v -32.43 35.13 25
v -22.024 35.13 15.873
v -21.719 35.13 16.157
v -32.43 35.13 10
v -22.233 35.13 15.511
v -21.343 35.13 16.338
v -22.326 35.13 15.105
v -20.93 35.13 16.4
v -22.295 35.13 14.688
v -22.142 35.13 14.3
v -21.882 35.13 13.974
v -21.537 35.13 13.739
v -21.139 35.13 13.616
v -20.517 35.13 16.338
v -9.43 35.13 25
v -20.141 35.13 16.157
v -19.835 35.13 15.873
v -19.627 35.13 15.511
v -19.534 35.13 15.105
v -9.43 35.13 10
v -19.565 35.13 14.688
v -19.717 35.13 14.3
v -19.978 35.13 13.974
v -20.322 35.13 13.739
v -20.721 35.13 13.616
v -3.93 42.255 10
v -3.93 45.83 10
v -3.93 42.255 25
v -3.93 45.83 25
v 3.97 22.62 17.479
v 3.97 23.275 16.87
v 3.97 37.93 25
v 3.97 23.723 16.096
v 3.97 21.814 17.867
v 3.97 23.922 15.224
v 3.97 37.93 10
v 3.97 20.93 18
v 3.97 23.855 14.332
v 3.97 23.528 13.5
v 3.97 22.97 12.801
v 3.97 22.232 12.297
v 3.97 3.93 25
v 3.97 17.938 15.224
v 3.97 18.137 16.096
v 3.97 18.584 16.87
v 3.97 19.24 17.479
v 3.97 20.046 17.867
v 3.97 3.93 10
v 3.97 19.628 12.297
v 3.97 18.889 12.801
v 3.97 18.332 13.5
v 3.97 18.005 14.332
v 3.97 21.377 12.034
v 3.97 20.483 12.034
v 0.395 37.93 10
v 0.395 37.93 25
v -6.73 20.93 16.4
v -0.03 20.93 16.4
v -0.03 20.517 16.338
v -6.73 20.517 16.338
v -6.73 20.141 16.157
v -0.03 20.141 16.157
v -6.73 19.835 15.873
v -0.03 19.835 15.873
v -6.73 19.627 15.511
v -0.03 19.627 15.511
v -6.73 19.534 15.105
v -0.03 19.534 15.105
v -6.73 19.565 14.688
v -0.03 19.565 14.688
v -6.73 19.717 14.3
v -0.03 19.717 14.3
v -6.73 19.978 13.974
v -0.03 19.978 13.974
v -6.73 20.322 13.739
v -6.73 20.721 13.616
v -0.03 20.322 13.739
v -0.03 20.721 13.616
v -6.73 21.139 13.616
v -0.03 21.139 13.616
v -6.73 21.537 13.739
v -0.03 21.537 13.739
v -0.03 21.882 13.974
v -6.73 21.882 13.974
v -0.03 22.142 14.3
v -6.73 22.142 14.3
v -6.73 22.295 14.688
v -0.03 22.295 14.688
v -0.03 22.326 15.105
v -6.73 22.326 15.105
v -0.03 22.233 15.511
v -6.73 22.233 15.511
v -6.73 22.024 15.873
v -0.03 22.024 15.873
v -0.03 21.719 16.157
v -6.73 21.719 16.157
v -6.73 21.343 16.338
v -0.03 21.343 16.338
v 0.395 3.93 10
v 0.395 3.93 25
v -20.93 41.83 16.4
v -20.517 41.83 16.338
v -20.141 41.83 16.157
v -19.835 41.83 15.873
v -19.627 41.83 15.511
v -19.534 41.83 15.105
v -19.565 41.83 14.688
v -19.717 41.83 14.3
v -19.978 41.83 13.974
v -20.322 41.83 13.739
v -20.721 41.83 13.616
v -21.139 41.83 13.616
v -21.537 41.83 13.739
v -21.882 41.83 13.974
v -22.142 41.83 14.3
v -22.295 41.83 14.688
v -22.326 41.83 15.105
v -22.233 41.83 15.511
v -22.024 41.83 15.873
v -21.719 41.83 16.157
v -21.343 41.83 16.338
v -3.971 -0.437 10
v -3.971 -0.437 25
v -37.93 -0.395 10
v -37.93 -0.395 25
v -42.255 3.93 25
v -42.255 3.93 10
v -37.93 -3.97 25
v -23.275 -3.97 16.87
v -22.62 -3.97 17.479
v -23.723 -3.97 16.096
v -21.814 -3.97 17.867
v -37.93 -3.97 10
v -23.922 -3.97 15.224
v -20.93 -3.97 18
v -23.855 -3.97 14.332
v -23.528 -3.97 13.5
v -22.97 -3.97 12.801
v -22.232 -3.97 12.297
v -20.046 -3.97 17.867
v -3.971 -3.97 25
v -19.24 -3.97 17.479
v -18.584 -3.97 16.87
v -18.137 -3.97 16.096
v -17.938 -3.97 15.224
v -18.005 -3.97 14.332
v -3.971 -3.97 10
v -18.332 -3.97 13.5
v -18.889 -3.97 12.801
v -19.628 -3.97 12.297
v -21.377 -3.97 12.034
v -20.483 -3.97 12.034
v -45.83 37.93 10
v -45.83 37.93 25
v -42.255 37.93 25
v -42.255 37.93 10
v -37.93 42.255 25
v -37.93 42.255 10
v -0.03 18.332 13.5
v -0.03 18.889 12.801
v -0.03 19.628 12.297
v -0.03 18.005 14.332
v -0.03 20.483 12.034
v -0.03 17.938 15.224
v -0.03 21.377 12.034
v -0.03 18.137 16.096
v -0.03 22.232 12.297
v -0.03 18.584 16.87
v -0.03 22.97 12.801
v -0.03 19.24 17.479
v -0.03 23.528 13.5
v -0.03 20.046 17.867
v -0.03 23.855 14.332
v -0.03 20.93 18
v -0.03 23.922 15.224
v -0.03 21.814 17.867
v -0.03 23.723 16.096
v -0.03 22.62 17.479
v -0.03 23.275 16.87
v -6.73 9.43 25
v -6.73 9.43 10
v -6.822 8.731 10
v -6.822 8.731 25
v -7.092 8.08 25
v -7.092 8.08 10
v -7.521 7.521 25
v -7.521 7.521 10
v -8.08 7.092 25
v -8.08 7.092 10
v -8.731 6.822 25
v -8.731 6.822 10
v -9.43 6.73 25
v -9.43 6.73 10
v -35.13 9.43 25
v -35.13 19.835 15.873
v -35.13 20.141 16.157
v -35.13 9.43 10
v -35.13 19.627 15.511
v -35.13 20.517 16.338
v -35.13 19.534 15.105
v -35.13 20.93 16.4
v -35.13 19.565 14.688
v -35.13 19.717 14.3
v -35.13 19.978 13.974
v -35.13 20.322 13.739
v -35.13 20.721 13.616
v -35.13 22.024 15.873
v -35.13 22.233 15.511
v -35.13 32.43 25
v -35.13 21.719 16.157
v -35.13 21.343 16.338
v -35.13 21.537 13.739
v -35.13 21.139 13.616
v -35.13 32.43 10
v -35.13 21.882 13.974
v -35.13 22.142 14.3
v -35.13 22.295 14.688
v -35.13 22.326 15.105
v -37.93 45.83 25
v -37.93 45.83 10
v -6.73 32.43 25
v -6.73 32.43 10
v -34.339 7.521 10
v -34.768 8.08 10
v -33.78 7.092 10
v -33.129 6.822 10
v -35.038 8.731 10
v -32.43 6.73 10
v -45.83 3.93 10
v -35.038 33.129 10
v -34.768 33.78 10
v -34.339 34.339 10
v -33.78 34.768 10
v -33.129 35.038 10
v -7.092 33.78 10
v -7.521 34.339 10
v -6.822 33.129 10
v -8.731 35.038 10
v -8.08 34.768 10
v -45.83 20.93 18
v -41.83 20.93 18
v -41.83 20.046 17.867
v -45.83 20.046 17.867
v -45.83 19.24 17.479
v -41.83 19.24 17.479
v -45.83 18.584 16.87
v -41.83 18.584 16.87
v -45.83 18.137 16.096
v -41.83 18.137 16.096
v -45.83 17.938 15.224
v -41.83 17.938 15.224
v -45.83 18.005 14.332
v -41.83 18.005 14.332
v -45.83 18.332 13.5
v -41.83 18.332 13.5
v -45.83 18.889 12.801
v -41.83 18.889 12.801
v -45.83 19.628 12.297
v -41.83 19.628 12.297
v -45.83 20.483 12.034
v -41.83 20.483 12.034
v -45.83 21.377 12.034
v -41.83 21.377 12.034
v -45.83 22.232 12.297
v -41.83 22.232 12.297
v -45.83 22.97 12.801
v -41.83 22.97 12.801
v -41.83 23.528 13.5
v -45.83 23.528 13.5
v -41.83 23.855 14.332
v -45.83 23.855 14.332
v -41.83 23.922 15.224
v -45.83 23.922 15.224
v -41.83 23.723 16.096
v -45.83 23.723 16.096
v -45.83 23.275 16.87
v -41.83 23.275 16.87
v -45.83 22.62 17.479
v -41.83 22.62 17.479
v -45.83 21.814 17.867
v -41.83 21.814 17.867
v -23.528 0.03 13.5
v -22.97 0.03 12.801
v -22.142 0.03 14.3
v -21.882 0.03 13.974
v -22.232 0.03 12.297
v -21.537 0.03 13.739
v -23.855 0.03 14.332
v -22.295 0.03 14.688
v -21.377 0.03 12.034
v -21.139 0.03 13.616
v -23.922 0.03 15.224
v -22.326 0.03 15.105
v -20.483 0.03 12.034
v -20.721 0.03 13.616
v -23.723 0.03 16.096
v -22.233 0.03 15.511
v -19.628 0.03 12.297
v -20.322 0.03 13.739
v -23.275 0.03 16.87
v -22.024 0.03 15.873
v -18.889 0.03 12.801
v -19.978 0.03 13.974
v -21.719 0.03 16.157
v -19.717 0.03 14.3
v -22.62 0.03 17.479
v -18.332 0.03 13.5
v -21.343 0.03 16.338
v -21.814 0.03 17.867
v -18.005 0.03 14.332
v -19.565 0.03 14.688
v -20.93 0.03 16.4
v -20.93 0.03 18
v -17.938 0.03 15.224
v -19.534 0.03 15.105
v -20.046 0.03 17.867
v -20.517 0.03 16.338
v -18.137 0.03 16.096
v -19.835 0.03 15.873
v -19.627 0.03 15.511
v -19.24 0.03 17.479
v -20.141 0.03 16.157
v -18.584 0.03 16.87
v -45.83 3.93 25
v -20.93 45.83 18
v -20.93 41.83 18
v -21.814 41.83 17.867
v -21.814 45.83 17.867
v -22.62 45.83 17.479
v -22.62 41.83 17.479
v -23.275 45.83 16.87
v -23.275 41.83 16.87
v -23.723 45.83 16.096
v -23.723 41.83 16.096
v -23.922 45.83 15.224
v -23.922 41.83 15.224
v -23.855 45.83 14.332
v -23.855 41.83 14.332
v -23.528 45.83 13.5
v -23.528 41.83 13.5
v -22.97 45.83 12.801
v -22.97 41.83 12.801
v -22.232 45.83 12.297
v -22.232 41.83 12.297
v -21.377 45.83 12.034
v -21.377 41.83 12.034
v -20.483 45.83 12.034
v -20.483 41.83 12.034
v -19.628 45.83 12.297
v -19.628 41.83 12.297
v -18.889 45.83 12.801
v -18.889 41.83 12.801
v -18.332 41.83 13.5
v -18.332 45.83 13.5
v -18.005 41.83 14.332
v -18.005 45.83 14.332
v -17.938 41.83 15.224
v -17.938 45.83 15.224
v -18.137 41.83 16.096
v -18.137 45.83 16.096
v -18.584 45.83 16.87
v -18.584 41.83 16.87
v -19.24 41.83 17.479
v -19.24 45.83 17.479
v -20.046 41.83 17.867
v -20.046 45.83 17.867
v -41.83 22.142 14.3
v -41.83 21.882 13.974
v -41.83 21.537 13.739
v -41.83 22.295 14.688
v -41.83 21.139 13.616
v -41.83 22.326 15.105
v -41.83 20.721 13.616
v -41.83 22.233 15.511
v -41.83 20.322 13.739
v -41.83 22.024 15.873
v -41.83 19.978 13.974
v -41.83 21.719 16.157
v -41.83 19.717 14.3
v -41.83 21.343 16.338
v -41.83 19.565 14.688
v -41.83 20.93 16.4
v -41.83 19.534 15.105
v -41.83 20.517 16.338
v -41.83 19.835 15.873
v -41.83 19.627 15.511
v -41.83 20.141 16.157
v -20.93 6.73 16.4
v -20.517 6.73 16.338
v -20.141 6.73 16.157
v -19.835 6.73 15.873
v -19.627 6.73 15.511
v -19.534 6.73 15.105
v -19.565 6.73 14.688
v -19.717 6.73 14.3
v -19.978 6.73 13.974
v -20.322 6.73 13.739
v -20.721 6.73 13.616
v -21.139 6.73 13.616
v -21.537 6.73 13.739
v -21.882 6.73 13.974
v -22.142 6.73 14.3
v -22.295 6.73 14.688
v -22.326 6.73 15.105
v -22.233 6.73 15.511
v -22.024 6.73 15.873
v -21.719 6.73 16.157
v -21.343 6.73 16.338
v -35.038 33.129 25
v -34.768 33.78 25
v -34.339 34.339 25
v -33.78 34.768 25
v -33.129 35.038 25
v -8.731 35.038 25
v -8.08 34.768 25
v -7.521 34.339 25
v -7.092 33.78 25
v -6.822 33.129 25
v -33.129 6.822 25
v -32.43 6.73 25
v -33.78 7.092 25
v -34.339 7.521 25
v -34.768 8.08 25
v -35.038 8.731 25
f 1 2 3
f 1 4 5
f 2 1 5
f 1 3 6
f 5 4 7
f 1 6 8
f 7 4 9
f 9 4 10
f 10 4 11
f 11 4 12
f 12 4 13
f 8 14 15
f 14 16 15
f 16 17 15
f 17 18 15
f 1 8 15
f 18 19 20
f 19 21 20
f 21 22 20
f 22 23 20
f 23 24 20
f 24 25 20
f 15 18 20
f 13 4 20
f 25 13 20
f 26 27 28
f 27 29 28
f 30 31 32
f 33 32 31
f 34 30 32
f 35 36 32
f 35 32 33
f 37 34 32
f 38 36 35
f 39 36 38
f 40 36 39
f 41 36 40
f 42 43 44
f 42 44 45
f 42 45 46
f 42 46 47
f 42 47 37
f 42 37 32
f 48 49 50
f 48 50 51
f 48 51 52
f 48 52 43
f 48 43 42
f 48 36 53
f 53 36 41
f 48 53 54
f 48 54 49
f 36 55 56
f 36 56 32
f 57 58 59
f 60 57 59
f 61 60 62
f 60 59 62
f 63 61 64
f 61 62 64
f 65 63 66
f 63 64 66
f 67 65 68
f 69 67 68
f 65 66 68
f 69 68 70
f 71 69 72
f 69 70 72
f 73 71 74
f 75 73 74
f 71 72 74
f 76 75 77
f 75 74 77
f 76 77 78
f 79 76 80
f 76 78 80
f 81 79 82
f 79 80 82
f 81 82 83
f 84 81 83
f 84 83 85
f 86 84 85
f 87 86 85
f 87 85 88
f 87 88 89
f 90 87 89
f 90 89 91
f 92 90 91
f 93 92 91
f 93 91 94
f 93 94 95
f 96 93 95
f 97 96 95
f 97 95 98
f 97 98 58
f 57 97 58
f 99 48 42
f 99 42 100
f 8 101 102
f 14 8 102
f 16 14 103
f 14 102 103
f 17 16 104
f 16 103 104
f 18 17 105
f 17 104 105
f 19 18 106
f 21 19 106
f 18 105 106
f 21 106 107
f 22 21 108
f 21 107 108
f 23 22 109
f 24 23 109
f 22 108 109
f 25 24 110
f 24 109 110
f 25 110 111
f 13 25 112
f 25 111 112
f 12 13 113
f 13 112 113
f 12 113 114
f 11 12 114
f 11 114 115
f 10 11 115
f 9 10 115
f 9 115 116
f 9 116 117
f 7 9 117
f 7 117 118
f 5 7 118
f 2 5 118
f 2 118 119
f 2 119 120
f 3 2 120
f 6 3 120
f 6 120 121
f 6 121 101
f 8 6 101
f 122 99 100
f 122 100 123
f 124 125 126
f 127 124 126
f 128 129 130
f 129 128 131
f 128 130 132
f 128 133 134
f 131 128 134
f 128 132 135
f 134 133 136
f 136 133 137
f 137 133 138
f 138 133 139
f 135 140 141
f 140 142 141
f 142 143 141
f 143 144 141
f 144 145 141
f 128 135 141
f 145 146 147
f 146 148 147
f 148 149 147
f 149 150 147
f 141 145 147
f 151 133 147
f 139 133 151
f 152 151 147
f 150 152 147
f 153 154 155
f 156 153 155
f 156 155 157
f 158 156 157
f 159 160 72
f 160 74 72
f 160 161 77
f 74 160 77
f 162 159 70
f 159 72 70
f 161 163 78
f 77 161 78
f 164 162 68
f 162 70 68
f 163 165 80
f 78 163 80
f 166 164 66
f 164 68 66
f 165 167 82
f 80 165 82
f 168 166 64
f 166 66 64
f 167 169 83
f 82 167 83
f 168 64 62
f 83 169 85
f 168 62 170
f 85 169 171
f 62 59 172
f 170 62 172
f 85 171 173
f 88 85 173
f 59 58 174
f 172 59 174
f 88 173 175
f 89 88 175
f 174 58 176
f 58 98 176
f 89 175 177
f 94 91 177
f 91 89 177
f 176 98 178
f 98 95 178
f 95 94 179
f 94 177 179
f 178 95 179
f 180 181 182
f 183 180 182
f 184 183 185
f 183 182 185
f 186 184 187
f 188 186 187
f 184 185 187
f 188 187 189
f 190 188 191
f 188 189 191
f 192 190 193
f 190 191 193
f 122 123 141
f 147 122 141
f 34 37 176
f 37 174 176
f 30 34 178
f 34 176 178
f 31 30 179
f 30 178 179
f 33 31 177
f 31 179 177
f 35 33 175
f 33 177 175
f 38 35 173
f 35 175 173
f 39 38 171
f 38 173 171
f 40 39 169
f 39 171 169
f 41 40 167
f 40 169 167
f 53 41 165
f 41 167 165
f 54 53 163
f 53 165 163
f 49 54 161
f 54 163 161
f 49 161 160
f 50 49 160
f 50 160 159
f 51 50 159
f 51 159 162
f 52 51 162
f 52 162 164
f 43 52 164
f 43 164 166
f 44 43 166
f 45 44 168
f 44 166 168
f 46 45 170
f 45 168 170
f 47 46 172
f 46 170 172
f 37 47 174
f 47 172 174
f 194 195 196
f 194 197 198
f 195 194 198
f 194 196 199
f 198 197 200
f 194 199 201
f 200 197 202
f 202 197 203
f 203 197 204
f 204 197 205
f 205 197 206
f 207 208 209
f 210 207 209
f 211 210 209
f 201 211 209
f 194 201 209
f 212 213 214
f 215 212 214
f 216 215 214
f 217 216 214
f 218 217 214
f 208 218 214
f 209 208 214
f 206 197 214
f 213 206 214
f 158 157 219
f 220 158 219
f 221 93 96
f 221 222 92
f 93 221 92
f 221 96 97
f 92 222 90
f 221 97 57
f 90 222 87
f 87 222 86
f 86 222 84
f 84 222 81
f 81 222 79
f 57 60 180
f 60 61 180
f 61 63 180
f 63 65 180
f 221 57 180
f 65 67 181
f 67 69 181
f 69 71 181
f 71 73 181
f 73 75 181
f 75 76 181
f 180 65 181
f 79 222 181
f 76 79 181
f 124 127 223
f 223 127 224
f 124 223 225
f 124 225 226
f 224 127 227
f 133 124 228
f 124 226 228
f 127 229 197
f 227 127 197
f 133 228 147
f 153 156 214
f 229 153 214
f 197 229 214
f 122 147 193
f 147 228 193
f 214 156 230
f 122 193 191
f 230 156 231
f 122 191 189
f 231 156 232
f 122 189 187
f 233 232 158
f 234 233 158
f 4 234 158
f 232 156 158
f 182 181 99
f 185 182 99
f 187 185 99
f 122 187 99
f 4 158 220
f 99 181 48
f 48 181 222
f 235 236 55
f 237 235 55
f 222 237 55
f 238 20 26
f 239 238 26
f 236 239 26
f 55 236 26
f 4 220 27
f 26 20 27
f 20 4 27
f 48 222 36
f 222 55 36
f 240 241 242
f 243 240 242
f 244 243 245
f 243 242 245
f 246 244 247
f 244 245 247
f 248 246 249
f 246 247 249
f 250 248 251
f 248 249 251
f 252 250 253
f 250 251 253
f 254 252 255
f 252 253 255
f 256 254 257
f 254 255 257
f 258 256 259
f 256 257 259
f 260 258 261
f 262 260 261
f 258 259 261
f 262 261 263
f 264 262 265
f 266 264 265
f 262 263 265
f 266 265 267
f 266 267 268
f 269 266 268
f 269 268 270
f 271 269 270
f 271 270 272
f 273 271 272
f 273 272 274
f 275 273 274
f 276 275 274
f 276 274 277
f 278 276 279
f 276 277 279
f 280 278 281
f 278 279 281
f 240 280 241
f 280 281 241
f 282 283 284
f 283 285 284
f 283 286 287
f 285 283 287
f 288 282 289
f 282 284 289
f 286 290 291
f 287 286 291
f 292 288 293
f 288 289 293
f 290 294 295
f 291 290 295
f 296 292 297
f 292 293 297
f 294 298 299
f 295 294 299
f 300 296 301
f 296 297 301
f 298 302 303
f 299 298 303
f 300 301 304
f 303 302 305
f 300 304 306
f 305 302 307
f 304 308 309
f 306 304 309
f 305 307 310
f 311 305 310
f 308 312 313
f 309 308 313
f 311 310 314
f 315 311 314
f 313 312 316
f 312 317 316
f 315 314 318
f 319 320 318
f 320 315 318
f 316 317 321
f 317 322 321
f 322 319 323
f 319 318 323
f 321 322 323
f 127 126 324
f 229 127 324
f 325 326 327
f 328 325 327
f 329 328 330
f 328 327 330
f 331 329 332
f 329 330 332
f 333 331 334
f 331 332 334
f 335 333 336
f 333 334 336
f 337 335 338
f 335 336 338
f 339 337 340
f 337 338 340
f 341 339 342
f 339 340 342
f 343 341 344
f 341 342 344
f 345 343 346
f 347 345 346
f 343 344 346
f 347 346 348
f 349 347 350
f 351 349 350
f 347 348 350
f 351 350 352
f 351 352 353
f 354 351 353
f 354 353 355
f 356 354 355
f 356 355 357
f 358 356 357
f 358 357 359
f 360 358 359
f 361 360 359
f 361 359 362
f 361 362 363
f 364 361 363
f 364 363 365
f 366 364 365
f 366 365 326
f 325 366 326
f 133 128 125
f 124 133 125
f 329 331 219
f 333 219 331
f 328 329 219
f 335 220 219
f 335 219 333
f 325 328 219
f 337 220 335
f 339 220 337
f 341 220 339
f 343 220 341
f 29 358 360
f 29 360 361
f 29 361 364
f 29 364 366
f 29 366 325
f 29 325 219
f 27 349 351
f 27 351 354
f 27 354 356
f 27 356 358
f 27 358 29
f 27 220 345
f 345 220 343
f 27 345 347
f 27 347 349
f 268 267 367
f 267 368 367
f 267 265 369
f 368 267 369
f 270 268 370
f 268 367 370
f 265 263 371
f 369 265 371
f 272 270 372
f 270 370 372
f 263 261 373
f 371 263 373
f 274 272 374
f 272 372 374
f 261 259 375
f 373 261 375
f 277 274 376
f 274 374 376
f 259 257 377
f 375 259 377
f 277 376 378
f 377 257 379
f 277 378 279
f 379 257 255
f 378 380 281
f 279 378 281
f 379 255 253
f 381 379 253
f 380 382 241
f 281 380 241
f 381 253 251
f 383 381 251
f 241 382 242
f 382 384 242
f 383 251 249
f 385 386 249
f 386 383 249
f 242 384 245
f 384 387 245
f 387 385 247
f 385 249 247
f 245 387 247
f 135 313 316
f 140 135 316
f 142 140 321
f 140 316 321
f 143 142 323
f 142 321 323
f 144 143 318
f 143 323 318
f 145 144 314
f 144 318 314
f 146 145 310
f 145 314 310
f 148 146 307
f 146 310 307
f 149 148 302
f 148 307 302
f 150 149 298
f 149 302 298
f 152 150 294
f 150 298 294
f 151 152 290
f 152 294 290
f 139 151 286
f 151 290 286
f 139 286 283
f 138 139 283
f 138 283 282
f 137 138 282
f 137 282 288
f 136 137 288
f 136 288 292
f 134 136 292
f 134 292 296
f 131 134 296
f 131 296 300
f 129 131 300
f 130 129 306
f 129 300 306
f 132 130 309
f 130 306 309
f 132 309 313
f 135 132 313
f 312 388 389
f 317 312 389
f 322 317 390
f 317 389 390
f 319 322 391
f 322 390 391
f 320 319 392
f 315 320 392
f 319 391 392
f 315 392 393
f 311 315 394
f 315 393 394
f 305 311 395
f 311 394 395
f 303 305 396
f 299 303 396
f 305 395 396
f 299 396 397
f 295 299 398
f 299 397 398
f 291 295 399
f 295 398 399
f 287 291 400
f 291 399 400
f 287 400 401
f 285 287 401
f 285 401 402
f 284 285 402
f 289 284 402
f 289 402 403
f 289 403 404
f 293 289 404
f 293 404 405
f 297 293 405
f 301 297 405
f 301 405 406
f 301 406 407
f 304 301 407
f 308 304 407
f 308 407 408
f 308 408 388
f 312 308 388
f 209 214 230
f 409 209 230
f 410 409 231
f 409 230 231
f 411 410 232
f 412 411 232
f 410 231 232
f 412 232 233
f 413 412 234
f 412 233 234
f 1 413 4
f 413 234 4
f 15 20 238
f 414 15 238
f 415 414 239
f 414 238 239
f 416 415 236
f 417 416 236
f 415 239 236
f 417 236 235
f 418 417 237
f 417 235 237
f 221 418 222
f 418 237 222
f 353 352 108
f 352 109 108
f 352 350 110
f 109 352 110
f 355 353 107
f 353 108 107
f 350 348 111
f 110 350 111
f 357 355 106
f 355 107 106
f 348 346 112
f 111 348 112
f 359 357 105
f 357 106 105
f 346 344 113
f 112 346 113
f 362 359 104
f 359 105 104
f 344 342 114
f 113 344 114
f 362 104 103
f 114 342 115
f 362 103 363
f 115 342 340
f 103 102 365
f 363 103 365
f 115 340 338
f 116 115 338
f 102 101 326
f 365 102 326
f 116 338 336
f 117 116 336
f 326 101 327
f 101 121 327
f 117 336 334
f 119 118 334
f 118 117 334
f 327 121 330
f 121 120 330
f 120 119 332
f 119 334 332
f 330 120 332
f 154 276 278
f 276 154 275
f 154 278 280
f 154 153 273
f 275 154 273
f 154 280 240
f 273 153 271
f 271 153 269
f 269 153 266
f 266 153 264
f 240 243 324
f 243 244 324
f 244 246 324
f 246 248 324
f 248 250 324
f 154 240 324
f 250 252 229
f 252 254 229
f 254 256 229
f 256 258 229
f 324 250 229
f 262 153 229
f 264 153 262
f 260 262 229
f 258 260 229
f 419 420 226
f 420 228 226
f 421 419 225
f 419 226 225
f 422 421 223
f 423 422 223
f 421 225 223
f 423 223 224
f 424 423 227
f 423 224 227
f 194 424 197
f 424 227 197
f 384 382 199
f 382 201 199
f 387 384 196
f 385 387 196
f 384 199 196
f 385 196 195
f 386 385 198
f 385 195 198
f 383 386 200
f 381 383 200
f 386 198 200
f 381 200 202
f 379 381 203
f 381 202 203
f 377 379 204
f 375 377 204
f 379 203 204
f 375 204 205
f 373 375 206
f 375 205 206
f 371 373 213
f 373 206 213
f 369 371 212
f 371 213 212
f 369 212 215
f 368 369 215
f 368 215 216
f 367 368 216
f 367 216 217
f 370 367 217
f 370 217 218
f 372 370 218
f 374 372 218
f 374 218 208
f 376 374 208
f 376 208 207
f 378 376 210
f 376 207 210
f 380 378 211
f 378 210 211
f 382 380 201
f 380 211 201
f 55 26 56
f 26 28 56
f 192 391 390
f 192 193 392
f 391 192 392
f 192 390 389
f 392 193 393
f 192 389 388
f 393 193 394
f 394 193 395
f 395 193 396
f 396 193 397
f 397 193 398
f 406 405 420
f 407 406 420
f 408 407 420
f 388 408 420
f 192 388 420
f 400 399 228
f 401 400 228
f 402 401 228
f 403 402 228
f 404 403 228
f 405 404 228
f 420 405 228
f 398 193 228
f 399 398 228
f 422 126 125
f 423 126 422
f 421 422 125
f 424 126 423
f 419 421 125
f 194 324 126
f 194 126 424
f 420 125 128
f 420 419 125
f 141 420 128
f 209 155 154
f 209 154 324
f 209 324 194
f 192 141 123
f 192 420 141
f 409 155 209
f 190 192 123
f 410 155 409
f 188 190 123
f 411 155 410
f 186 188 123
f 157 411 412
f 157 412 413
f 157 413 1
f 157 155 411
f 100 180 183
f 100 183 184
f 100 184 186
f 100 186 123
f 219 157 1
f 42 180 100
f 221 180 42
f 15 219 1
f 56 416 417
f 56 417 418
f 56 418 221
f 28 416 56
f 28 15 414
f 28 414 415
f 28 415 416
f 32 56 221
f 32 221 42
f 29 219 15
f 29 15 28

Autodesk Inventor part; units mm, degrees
ref_plane "YZ Plane" through (0, 0, 0) normal (1, 0, 0) x (0, 1, 0)
ref_plane "XZ Plane" through (0, 0, 0) normal (0, 1, 0) x (-1, 0, 0)
ref_plane "XY Plane" through (0, 0, 0) normal (0, 0, 1) x (1, 0, 0)
ref_plane "Work Plane5" through (0, 0, 10) normal (0, 0, 1) x (1, 0, 0)
sketch "Sketch1" plane through (0, 0, 10) normal (0, 0, 1) x (1, 0, 0)
  line L0 (-4.0299, -0.3538) -> (-2.2322, 1.4439) construction
  arc A0 (-1.4439, 2.2322) -> (-2.2322, 1.4439) centre (-0.9299, 0.9299) ccw construction
  line L1 (-1.4439, 2.2322) -> (0.3538, 4.0299) construction
  line L2 (-37.8299, 42.8299) -> (-37.8299, 37.8299) construction
  line L3 (-37.8299, 37.8299) -> (-42.9208, 37.8299) construction
  line L4 (-37.8299, 42.2137) -> (-37.8299, 45.8299) construction
  line L5 (-37.8299, 45.8299) -> (-4.0299, 45.8299) construction
  line L6 (-4.0299, 45.8299) -> (-4.0299, 42.2137) construction
  line L7 (-4.0299, 4.0299) -> (0.3538, 4.0299) projected
  circle A1 centre (-20.9299, 20.9299) radius 17.5 projected
  line L8 (-20.9299, 58.9723) -> (17.1124, 20.9299) construction
  line L9 (17.1124, 20.9299) -> (-20.9299, -17.1124) construction
  line L10 (-20.9299, -17.1124) -> (-58.9723, 20.9299) construction
  line L11 (-58.9723, 20.9299) -> (-20.9299, 58.9723) construction
  line L12 (-20.9299, 58.9723) -> (-20.9299, -17.1124) construction
  line L13 (17.1124, 20.9299) -> (-58.9723, 20.9299) construction
  line L14 (-20.9299, 58.9723) -> (32.8701, 58.9723) construction
  line L15 (-43.4299, 43.4299) -> (1.5701, 43.4299) construction
  line L16 (1.5701, 43.4299) -> (1.5701, -1.5701) construction
  line L17 (1.5701, -1.5701) -> (-43.4299, -1.5701) construction
  line L18 (-43.4299, -1.5701) -> (-43.4299, 43.4299) construction
  line L19 (-43.4299, 43.4299) -> (1.5701, -1.5701) construction
  line L20 (1.5701, 43.4299) -> (-43.4299, -1.5701) construction
  line L21 (-43.4299, 5.3876) -> (-43.4299, 36.4723)
  line L22 (-43.4299, 36.4723) -> (-36.4723, 43.4299)
  line L23 (-36.4723, 43.4299) -> (-5.3876, 43.4299)
  line L24 (-5.3876, 43.4299) -> (1.5701, 36.4723)
  line L25 (1.5701, 36.4723) -> (1.5701, 5.3876)
  line L26 (1.5701, 5.3876) -> (-5.3876, -1.5701)
  line L27 (-5.3876, -1.5701) -> (-36.4723, -1.5701)
  line L28 (-36.4723, -1.5701) -> (-43.4299, 5.3876)
  line L29 (-4.0299, 42.2137) -> (-37.8299, 42.2137) projected
  line L30 (-4.0299, -0.3538) -> (-4.0299, 4.0299) projected
  circle A2 centre (-20.9299, 20.9299) radius 1.5
  line L31 (-10.9299, 10.9299) -> (-30.9299, 10.9299) construction
  line L32 (-30.9299, 10.9299) -> (-30.9299, 30.9299) construction
  line L33 (-30.9299, 30.9299) -> (-10.9299, 30.9299) construction
  line L34 (-10.9299, 30.9299) -> (-10.9299, 10.9299) construction
  line L35 (-10.9299, 10.9299) -> (-30.9299, 30.9299) construction
  line L36 (-30.9299, 10.9299) -> (-10.9299, 30.9299) construction
  circle A3 centre (-30.9299, 30.9299) radius 1.4
  circle A4 centre (-30.9299, 10.9299) radius 1.4
  circle A5 centre (-10.9299, 10.9299) radius 1.4
  line L37 (-45.8299, 37.8299) -> (-42.0723, 37.8299) construction
  line L38 (-42.1723, 37.7299) -> (-45.8299, 37.7299)
  line L39 (-45.8299, 37.7299) -> (-45.8299, 4.1299)
  line L40 (-45.8299, 4.1299) -> (-42.1723, 4.1299)
  line L41 (-42.1723, 4.1299) -> (-42.1723, 37.7299)
  line L42 (-45.8299, 4.0299) -> (-42.0723, 4.0299) construction
  line L43 (-45.8299, 37.8299) -> (-42.0723, 37.8299) projected
  line L44 (-37.7299, 45.8299) -> (-4.1299, 45.8299)
  line L45 (-4.1299, 45.8299) -> (-4.1299, 42.1723)
  line L46 (-4.1299, 42.1723) -> (-37.7299, 42.1723)
  line L47 (-37.7299, 42.1723) -> (-37.7299, 45.8299)
  line L48 (0.4701, 37.8299) -> (0.4701, 4.0299) construction
  line L49 (0.4701, 4.0299) -> (3.9701, 4.0299) construction
  line L50 (3.9701, 37.8299) -> (3.9701, 4.0299) construction
  line L51 (0.4701, 37.8299) -> (3.9701, 37.8299) construction
  line L52 (-45.8299, -3.9701) -> (-4.0299, -3.9701) construction
  line L53 (0.3124, 37.7299) -> (3.9701, 37.7299)
  line L54 (3.9701, 37.7299) -> (3.9701, 4.1299)
  line L55 (3.9701, 4.1299) -> (0.3124, 4.1299)
  line L56 (0.3124, 4.1299) -> (0.3124, 37.7299)
  line L57 (-4.1713, -0.3538) -> (-37.7299, -0.3538)
  line L58 (-37.7299, -0.3538) -> (-37.7299, -3.9701)
  line L59 (-37.7299, -3.9701) -> (-4.1713, -3.9701)
  line L60 (-4.1713, -3.9701) -> (-4.1713, -0.3538)
  point P0 (-37.8299, 4.0299)
  dimension "d18" = 53.8
  dimension "d19" = 45
  dimension "d20" = 53.8
  dimension "d21" = 45
  dimension "d22" = 45
  dimension "d30" = 20
  dimension "d31" = 20
  dimension "d32" = 2.8
  dimension "d33" = 2.8
  dimension "d34" = 2.8
  dimension "d35" = 3
  dimension "d36" = 0.1
  dimension "d37" = 0.1
  dimension "d38" = 0.1
  dimension "d39" = 0.1
extrude "Extrusion1" add sketch "Sketch1" along normal blind 15 contours L30 L26 L57 L28 L41 L22 L46 L24 L56 L7 | L7 L26 L30 | L56 L24 L25 L26 | L26 L25 L24 L53 L54 L55 | L60 L59 L58 L57 L28 L27 L26 | L26 L27 L28 L57 | L46 L22 L29 L24 | L24 L29 L45 | L40 L39 L38 L22 L21 L28 | L28 L21 L22 L41 | L29 L22 L23 L24 | L24 L23 L22 L29 L47 L44 L45 | L47 L29 L22 | A1 | A2 | A3 | A4 | A5
sketch "Skizze4" plane through (0, 0, 25) normal (0, 0, 1) x (1, 0, 0)
  line L0 (-37.7299, 42.1723) -> (-42.1723, 37.7299) projected
  line L1 (-42.1723, 37.7299) -> (-45.8299, 37.7299) projected
  line L2 (-45.8299, 37.7299) -> (-45.8299, 4.1299) construction
  line L3 (-45.8299, 4.1299) -> (-42.1723, 4.1299) projected
  line L4 (-42.1723, 4.1299) -> (-37.6885, -0.3538) projected
  line L5 (-37.6885, -0.3538) -> (-37.7299, -0.3538) projected
  line L6 (-37.7299, -0.3538) -> (-37.7299, -3.9701) projected
  line L7 (-37.7299, -3.9701) -> (-4.1713, -3.9701) construction
  line L8 (-4.1713, -3.9701) -> (-4.1713, -0.3538) projected
  line L9 (-4.1713, -0.3538) -> (0.3124, 4.1299) projected
  line L10 (0.3124, 4.1299) -> (3.9701, 4.1299) projected
  line L11 (3.9701, 4.1299) -> (3.9701, 37.7299) construction
  line L12 (3.9701, 37.7299) -> (0.3124, 37.7299) projected
  line L13 (0.3124, 37.7299) -> (-4.1299, 42.1723) projected
  line L14 (-4.1299, 42.1723) -> (-4.1299, 45.8299) projected
  line L15 (-4.1299, 45.8299) -> (-37.7299, 45.8299) construction
  line L16 (-37.7299, 45.8299) -> (-37.7299, 42.1723) projected
  line L17 (-37.9299, 46.0299) -> (-3.9299, 46.0299) construction
  line L18 (-3.9299, 46.0299) -> (-3.9299, 42.2551)
  line L19 (-3.9299, 42.2551) -> (0.3953, 37.9299)
  line L20 (0.3953, 37.9299) -> (4.1701, 37.9299)
  line L21 (4.1701, 37.9299) -> (4.1701, 3.9299) construction
  line L22 (4.1701, 3.9299) -> (0.3953, 3.9299)
  line L23 (0.3953, 3.9299) -> (-3.9713, -0.4367)
  line L24 (-3.9713, -0.4367) -> (-3.9713, -4.1701)
  line L25 (-3.9713, -4.1701) -> (-37.9299, -4.1701) construction
  line L26 (-37.9299, -4.1701) -> (-37.9299, -0.3953)
  line L27 (-37.9299, -0.3953) -> (-42.2551, 3.9299)
  line L28 (-42.2551, 3.9299) -> (-46.0299, 3.9299)
  line L29 (-46.0299, 3.9299) -> (-46.0299, 37.9299) construction
  line L30 (-46.0299, 37.9299) -> (-42.2551, 37.9299)
  line L31 (-42.2551, 37.9299) -> (-37.9299, 42.2551)
  line L32 (-37.9299, 42.2551) -> (-37.9299, 46.0299)
  line L33 (-45.8299, 37.7299) -> (-45.8299, 37.9299)
  line L34 (-4.1299, 45.8299) -> (-37.7299, 45.8299) projected
  line L35 (-37.7299, 45.8299) -> (-37.9299, 45.8299)
  line L36 (-4.1299, 45.8299) -> (-3.9299, 45.8299)
  line L37 (3.9701, 37.7299) -> (3.9701, 37.9299)
  line L38 (3.9701, 4.1299) -> (3.9701, 37.7299) projected
  line L39 (3.9701, 4.1299) -> (3.9701, 3.9299)
  line L40 (-4.1713, -3.9701) -> (-3.9713, -3.9701)
  line L41 (-37.7299, -3.9701) -> (-37.9299, -3.9701)
  line L42 (-45.8299, 4.1299) -> (-45.8299, 3.9299)
  point P0 (0, 0)
  dimension "d40" = 0.2
extrude "IM_offset" add sketch "Skizze4" against normal up to surface (15 mm away)
sketch "Sketch29" plane through (0, 0, 10) normal (0, 0, -1) x (-1, 0, 0)
  line L0 (9.4299, 6.9299) -> (32.4299, 6.9299) projected
  arc A0 (6.9299, 9.4299) -> (9.4299, 6.9299) centre (9.4299, 9.4299) ccw projected
  line L1 (6.9299, 32.4299) -> (6.9299, 9.4299) projected
  arc A1 (9.4299, 34.9299) -> (6.9299, 32.4299) centre (9.4299, 32.4299) ccw projected
  line L2 (32.4299, 34.9299) -> (9.4299, 34.9299) projected
  arc A2 (34.9299, 32.4299) -> (32.4299, 34.9299) centre (32.4299, 32.4299) ccw projected
  line L3 (34.9299, 9.4299) -> (34.9299, 32.4299) projected
  arc A3 (32.4299, 6.9299) -> (34.9299, 9.4299) centre (32.4299, 9.4299) ccw projected
  circle A4 centre (20.9299, 20.9299) radius 11 projected
  circle A5 centre (9.4299, 32.4299) radius 1.025 projected
  circle A6 centre (9.4299, 9.4299) radius 1.025 projected
  circle A7 centre (32.4299, 9.4299) radius 1.025 projected
  circle A8 centre (32.4299, 32.4299) radius 1.025 projected
  arc A9 (6.7299, 9.4299) -> (9.4299, 6.7299) centre (9.4299, 9.4299) ccw
  line L4 (9.4299, 6.7299) -> (32.4299, 6.7299)
  arc A10 (32.4299, 6.7299) -> (35.1299, 9.4299) centre (32.4299, 9.4299) ccw
  line L5 (35.1299, 9.4299) -> (35.1299, 32.4299)
  arc A11 (35.1299, 32.4299) -> (32.4299, 35.1299) centre (32.4299, 32.4299) ccw
  line L6 (32.4299, 35.1299) -> (9.4299, 35.1299)
  arc A12 (9.4299, 35.1299) -> (6.7299, 32.4299) centre (9.4299, 32.4299) ccw
  line L7 (6.7299, 32.4299) -> (6.7299, 9.4299)
  point P0 (0, 0)
  dimension "d176" = 0.2
extrude "Extrusion23" cut sketch "Sketch29" against normal through all contours A0 L1 A1 L2 A2 L3 A3 L0 | A4 | A5 | A6 | A7 | A8 | L7 A12 L6 A11 L5 A10 L4 A9
sketch "Sketch30" plane through (-45.8299, 0, 10) normal (-1, 0, 0) x (0, 0, 1)
  line L0 (35.0799, 45.8299) -> (6.8799, 45.8299)
  line L1 (0, 3.9299) -> (0, 37.9299) projected
  line L2 (15, 3.9299) -> (0, 3.9299) projected
  line L3 (15, 37.9299) -> (15, 3.9299) projected
  line L4 (15, 37.9299) -> (0, 37.9299) projected
  circle A0 centre (5, 20.9299) radius 1.7201
  point P0 (-10, 0)
ref_plane "Arbeitsebene7" through (-20.9299, 3.9299, 10) normal (-1, 0, 0) x (0, 0, 1)
ref_plane "Arbeitsebene8" through (-37.9299, 20.9299, 10) normal (0, 1, 0) x (1, 0, 0)
ref_plane "Arbeitsebene9" through (-20.9299, 3.9299, 10) normal (-1, 0, 0) x (0, 0, 1)
ref_plane "Arbeitsebene10" through (-37.9299, 20.9299, 10) normal (0, -1, 0) x (1, 0, 0)
hole "Bohrung2" at (-45.8299, 20.9299, 15) direction (1, 0, 0) diameter 2.8 end through all counterbore diameter 6 counterbore depth 4
pattern_circular "Runde Anordnung2" count 4 over 360 about axis through (-20.9299, 20.9299, 10) along (0, 0, 1) of "Bohrung2"
ref_plane "Arbeitsebene11" through (-20.9299, 3.9299, 10) normal (1, 0, 0) x (0, 0, -1)
ref_plane "Arbeitsebene12" through (-37.9299, 20.9299, 10) normal (0, 1, 0) x (1, 0, 0)
properties part number "30_Cube_Z_Focus_MGN_NEMA_Motorsupport_centered"
